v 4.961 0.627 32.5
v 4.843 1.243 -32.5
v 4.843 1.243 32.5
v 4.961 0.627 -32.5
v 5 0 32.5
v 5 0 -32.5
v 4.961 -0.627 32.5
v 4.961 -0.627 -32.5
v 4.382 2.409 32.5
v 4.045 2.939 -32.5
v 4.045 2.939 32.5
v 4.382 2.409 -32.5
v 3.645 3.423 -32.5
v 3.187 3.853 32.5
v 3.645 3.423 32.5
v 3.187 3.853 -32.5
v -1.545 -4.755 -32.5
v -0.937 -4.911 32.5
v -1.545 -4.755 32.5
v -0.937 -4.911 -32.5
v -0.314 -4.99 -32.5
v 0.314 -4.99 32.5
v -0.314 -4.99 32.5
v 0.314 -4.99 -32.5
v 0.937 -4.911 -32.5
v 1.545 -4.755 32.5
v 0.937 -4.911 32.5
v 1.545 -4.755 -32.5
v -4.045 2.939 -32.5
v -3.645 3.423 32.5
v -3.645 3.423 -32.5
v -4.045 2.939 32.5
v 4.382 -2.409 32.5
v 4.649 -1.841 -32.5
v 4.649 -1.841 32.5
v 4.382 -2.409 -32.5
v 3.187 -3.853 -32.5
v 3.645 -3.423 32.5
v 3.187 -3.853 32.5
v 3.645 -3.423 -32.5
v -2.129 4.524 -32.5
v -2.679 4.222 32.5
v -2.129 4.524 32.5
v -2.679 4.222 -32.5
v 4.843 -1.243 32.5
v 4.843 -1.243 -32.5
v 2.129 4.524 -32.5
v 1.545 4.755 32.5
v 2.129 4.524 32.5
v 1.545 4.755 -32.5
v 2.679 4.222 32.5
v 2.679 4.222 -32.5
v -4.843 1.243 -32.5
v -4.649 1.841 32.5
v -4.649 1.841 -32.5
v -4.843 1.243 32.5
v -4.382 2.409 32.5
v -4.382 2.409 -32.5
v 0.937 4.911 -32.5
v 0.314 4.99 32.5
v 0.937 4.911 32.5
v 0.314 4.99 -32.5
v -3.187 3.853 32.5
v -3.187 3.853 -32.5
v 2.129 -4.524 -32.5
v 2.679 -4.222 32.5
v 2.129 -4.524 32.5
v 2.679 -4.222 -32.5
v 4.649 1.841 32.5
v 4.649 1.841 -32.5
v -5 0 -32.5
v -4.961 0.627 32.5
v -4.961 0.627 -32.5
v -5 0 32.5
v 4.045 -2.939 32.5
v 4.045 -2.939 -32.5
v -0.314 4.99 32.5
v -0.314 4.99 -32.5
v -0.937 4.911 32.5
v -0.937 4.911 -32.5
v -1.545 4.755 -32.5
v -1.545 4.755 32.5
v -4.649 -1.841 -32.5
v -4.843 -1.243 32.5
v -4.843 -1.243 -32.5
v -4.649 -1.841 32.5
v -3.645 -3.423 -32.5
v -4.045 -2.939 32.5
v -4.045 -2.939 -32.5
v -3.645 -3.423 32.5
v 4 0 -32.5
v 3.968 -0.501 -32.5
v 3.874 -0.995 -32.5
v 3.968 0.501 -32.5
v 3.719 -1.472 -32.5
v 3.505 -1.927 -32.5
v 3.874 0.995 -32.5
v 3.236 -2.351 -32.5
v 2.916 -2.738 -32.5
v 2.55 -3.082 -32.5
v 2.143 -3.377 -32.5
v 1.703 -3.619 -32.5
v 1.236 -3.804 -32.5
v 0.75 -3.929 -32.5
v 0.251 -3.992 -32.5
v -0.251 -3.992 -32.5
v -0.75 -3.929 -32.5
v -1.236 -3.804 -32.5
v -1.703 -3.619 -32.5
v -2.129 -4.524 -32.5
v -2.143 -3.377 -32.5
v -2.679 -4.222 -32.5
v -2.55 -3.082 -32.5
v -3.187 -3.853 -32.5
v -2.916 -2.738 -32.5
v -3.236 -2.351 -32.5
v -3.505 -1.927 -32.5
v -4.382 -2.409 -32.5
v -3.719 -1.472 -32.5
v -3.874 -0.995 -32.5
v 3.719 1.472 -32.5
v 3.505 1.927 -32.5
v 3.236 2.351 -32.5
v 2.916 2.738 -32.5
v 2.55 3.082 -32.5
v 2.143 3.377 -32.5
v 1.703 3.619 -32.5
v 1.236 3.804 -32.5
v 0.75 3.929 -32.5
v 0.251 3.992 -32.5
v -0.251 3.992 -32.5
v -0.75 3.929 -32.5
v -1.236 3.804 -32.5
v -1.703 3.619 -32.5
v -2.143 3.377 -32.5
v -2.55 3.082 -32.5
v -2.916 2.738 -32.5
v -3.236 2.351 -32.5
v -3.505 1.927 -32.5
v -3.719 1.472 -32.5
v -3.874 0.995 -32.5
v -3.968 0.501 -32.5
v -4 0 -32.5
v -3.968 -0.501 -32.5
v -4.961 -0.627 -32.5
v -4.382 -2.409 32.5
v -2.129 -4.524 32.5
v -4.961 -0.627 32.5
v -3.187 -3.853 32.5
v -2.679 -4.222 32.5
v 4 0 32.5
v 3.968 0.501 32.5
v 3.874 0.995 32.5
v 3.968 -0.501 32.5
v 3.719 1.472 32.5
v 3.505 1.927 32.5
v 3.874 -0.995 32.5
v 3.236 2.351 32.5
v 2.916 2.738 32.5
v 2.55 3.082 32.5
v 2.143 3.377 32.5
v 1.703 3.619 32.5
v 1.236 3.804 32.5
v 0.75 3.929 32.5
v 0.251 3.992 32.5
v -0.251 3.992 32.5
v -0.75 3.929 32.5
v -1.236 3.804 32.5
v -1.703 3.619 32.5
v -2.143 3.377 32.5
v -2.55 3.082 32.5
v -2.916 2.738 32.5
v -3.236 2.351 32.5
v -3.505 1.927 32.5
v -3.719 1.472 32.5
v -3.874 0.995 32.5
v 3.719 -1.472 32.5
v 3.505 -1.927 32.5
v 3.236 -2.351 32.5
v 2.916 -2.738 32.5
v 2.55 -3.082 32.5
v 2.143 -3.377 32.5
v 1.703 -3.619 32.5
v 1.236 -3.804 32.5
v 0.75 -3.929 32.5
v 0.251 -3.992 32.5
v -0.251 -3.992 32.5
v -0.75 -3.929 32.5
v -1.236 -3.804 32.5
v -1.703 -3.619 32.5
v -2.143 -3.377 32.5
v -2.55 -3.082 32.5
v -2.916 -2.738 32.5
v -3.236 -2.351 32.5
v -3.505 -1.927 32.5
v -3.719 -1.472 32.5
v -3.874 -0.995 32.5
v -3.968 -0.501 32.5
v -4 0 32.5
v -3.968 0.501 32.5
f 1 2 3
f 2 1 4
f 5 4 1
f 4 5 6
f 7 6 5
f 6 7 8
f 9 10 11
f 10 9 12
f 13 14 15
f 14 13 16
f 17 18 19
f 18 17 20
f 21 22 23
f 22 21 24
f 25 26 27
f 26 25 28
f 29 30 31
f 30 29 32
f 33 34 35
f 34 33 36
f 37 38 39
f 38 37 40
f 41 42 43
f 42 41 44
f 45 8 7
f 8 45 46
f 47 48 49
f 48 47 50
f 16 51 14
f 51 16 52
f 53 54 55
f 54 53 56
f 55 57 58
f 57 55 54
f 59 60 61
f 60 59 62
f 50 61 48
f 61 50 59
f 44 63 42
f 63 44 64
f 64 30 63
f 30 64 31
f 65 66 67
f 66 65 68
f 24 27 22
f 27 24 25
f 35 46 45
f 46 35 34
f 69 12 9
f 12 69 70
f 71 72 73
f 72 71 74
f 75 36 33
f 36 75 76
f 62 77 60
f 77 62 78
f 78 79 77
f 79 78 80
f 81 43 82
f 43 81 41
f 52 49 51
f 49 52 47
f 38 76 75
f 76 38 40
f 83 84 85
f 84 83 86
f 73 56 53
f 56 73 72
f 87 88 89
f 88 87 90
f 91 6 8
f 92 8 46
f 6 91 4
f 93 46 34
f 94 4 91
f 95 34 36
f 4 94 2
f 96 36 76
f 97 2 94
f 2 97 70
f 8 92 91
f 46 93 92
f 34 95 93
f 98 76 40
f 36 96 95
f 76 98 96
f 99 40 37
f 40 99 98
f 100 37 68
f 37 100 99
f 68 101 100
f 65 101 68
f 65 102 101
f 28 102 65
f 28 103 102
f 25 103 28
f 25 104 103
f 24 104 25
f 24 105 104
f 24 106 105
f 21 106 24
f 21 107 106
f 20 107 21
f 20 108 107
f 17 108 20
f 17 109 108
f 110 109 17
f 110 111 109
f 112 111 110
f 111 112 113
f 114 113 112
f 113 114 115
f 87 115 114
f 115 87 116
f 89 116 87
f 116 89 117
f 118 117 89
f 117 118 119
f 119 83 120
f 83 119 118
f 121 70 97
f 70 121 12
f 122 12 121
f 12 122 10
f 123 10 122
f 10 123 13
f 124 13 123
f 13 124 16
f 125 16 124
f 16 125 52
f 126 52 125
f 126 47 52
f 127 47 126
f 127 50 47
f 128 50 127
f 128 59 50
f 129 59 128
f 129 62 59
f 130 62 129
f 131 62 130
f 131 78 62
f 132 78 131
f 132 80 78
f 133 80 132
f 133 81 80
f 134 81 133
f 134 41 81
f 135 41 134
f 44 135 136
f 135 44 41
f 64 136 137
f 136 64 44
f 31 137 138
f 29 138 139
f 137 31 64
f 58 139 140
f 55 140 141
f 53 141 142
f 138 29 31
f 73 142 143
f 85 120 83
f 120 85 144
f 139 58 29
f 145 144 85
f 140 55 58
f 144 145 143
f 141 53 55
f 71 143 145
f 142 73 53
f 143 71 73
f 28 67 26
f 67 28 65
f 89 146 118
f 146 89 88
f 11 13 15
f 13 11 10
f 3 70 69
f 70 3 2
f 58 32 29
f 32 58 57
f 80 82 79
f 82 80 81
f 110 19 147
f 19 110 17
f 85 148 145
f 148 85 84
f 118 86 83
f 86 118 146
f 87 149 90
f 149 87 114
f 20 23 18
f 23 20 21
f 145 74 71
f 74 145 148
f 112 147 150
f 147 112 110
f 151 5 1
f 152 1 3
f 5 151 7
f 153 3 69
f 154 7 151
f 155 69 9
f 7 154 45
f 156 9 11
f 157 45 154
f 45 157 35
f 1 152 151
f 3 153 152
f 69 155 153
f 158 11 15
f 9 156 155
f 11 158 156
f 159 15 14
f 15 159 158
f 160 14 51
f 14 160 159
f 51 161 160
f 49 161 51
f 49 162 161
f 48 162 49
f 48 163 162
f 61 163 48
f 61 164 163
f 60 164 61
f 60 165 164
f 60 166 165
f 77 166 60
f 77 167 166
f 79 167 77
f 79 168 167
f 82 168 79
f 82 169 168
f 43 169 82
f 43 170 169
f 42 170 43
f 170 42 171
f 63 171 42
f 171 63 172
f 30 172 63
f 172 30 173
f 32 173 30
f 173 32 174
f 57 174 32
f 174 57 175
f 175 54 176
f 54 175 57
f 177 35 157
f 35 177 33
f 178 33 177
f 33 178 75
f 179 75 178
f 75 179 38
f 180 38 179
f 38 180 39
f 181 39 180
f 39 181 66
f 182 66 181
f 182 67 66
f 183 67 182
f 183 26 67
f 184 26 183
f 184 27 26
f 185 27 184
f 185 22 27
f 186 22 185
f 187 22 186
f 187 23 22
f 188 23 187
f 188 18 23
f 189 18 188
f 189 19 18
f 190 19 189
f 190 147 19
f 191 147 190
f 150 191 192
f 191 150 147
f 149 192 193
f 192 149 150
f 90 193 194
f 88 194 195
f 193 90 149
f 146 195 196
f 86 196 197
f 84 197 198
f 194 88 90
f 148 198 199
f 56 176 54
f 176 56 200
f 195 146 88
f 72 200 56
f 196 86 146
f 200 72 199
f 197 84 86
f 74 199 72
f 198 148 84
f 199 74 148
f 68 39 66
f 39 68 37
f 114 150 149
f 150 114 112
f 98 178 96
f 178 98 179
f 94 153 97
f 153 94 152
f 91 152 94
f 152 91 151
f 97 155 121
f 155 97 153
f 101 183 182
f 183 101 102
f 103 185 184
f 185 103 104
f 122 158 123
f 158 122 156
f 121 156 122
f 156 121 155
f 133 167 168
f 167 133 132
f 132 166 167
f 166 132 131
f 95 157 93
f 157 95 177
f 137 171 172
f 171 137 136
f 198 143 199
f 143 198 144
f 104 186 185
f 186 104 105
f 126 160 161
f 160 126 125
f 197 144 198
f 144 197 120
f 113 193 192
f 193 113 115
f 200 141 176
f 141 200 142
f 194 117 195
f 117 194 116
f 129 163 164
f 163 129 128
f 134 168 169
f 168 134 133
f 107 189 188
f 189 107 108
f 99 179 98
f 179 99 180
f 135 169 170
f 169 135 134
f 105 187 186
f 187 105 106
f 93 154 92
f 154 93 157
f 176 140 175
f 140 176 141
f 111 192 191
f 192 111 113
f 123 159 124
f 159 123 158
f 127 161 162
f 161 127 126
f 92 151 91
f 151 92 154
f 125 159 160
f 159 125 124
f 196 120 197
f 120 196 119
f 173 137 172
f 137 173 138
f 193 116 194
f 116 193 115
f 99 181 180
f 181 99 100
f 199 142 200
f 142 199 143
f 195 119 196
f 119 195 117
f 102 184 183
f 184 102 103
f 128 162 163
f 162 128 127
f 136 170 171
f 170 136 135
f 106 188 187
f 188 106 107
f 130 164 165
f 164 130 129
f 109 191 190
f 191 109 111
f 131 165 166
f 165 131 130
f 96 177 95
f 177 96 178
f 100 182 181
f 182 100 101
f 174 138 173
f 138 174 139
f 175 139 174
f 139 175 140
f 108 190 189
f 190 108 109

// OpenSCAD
$fn = 50;


difference() {
	union() {
		translate(v = [0, 0, -32.5000000000]) {
			cylinder(h = 65, r = 5.0000000000);
		}
	}
	union() {
		translate(v = [0, 0, -100.0000000000]) {
			cylinder(h = 200, r = 4.0000000000);
		}
	}
}
